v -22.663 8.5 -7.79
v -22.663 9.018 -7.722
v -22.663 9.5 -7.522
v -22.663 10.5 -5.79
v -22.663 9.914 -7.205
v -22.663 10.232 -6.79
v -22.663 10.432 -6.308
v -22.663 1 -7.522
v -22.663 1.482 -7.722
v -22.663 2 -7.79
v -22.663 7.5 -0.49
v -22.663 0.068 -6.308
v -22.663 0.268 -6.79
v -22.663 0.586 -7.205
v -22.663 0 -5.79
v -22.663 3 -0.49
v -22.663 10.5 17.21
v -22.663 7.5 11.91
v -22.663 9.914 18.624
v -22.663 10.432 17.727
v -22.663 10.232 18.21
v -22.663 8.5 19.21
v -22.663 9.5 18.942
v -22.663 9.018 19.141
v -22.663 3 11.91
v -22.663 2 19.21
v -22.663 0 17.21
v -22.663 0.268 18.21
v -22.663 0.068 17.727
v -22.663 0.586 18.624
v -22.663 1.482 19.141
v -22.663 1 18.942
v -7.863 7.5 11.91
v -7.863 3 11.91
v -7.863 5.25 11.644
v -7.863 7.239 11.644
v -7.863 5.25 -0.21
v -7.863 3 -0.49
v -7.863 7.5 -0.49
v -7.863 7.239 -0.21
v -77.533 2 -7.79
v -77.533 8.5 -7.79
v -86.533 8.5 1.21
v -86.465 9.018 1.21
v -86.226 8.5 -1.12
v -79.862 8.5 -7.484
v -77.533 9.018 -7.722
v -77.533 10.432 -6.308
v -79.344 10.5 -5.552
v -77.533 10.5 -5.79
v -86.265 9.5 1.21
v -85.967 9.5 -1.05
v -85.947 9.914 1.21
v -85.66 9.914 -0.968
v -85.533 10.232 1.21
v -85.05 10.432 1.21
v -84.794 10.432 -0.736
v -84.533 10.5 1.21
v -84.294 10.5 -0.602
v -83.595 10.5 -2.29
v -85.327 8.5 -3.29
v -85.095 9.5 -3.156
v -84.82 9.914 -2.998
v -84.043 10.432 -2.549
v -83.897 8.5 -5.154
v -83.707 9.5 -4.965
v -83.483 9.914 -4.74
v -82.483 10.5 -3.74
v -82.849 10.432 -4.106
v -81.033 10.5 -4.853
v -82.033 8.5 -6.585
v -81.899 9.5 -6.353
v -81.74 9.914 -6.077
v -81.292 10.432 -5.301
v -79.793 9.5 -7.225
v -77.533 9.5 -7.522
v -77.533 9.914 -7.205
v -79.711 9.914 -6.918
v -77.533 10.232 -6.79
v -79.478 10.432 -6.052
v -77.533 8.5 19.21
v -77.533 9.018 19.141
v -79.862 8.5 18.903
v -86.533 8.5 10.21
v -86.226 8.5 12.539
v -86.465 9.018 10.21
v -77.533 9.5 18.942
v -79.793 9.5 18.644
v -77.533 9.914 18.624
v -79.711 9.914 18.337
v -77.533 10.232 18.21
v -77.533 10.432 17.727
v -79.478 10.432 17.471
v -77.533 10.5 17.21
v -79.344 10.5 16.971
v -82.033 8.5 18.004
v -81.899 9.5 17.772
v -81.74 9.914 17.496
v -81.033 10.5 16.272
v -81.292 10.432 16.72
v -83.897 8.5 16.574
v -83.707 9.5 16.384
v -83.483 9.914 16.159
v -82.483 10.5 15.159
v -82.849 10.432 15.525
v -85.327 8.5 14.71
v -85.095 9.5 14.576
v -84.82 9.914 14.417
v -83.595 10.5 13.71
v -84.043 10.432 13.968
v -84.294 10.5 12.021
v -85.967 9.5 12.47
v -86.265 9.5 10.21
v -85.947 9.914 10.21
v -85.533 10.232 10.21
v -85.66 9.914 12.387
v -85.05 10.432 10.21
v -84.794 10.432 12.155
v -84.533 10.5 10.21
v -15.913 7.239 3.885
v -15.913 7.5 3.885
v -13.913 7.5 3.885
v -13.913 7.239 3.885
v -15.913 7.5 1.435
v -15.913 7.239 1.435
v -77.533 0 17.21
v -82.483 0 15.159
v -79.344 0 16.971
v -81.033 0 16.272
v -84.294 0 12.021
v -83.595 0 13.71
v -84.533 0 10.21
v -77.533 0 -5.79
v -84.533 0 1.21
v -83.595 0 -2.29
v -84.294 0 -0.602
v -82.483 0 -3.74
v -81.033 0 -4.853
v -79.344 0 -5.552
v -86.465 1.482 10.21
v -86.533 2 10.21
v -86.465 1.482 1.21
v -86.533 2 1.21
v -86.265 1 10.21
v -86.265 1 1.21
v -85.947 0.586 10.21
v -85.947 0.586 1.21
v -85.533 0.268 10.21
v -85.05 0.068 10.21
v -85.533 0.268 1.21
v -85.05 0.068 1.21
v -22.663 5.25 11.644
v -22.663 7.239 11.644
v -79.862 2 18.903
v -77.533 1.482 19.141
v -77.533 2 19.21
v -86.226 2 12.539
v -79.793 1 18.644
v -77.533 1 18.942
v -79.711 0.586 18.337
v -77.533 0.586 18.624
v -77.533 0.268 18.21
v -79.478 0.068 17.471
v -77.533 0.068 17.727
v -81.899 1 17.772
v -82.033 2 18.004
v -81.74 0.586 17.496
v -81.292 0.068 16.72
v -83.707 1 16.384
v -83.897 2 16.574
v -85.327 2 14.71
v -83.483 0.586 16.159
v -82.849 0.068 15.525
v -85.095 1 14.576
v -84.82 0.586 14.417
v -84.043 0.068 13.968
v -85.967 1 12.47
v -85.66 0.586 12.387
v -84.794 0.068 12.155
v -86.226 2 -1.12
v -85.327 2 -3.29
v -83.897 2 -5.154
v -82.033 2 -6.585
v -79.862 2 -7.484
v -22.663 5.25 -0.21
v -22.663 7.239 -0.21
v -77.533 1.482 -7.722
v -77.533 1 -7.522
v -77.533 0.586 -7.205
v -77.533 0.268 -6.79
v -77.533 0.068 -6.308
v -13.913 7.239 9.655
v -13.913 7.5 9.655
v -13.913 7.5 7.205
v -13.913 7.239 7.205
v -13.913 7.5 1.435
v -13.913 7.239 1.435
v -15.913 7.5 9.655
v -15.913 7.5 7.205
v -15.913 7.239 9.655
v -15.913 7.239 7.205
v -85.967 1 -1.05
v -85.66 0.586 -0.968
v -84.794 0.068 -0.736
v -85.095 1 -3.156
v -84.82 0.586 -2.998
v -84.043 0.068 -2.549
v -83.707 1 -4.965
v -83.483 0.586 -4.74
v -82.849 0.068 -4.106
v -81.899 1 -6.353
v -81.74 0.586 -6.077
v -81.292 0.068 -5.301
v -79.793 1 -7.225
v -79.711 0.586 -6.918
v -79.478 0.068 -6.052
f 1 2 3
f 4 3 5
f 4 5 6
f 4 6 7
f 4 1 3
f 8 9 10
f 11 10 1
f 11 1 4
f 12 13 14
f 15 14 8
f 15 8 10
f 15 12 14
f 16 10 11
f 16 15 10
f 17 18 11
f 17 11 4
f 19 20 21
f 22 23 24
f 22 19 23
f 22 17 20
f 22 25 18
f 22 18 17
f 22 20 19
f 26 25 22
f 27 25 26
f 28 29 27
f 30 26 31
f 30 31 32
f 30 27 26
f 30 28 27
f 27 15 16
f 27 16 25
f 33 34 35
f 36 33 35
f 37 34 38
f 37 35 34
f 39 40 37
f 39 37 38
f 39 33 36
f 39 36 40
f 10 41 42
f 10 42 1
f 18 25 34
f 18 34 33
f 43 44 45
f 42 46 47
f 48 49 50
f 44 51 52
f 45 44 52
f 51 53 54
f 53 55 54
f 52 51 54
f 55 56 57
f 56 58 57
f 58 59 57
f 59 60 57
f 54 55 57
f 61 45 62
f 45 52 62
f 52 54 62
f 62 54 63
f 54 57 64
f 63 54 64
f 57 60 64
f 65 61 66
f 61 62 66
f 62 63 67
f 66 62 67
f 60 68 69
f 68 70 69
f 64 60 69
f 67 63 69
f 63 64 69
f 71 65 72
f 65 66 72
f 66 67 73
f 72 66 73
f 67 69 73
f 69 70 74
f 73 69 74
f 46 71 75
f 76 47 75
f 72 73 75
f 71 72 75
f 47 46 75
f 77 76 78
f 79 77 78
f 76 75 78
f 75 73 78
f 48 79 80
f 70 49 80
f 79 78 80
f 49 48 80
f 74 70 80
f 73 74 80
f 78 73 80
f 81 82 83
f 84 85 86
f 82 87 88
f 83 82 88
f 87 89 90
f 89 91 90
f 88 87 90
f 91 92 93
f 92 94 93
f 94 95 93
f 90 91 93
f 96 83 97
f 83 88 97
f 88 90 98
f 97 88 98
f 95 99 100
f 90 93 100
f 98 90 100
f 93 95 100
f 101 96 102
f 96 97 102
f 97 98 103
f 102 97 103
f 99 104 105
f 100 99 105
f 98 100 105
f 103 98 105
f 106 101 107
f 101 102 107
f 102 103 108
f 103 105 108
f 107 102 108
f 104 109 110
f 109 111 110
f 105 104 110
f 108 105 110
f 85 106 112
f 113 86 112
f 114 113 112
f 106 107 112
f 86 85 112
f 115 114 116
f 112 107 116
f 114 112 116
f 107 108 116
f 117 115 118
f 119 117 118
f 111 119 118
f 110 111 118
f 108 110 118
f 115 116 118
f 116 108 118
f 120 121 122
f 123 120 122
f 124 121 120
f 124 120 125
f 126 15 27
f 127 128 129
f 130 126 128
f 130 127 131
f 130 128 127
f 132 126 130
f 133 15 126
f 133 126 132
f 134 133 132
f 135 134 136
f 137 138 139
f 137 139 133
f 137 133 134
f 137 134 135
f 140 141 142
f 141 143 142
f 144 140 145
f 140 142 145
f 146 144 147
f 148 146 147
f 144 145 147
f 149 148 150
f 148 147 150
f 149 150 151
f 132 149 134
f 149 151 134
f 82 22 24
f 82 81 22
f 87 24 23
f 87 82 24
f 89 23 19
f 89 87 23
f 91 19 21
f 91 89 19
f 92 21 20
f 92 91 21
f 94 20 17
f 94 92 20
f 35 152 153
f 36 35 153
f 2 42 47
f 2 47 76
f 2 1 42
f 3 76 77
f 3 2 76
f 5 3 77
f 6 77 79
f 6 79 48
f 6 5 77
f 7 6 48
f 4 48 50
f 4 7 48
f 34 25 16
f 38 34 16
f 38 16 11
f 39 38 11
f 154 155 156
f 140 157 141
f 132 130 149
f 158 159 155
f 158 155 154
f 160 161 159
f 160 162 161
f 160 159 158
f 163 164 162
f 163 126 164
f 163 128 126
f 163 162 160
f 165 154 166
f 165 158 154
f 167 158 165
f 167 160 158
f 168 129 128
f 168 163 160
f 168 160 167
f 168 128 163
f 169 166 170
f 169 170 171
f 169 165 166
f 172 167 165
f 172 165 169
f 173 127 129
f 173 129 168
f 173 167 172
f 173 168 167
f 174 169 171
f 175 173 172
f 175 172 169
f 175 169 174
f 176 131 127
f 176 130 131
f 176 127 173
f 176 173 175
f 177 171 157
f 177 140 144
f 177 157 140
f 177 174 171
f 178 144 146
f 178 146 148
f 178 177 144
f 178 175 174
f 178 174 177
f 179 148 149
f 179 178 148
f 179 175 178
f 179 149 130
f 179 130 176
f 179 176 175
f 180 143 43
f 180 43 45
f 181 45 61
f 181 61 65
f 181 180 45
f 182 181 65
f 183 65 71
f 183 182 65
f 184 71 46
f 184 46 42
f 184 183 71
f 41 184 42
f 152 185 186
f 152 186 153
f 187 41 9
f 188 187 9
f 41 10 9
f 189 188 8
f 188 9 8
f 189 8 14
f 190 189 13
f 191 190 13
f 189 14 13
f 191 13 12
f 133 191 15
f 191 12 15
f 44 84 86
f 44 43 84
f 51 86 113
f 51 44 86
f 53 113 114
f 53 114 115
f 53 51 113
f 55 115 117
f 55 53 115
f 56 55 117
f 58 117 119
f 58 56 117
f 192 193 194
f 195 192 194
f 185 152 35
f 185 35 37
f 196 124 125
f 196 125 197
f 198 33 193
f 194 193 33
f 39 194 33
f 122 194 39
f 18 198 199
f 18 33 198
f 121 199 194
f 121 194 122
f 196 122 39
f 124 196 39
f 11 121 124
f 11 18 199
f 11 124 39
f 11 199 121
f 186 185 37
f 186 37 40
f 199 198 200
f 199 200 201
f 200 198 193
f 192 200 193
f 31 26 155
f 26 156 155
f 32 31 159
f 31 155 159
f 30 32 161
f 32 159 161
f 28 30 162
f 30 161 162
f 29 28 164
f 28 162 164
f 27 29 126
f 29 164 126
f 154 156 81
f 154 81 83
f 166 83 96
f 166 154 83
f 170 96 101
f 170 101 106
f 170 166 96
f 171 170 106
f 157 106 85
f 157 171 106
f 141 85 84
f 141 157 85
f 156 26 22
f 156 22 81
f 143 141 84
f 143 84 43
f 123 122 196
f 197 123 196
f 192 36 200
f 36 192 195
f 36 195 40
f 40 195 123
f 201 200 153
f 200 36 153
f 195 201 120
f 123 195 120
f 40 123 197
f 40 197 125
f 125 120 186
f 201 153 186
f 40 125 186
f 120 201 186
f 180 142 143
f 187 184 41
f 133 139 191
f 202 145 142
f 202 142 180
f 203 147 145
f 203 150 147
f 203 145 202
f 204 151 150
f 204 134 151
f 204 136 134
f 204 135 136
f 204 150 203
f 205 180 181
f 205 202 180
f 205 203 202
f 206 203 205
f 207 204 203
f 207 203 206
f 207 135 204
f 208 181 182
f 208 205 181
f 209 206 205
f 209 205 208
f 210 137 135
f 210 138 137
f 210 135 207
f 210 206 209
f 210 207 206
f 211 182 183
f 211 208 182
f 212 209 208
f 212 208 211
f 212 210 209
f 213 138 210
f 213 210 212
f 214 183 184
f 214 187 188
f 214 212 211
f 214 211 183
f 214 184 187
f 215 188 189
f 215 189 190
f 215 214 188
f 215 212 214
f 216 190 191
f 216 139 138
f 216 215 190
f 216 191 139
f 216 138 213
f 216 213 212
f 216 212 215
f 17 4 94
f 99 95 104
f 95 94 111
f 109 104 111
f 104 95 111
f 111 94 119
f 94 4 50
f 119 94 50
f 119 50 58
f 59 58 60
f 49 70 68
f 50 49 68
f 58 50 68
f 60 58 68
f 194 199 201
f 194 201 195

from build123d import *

# Parameters (mm, degrees)
BOSS_EXTRUDE1_DEPTH = 10.5
FILLET3_R           = 2
SKETCH3_W           = 12.4
SKETCH3_H           = 4.5
SKETCH3_W_2         = 11.854567875
SKETCH3_H_2         = 1.988610451
BOSS_EXTRUDE2_DEPTH = 14.8
SKETCH4_W           = 2
SKETCH4_H           = 2.45
CUT_EXTRUDE1_DEPTH  = 1


with BuildPart() as part:
    # Sketch1 → Boss-Extrude1 (new body)
    with BuildSketch(Plane(origin=(0, 0, 0), x_dir=(1, 0, 0), z_dir=(0, 1, 0))):
        with BuildLine():
            ThreePointArc((-77.532758891, -19.20955436), (-83.896719922, -16.57351539), (-86.532758891, -10.20955436))
            Line((-86.532758891, -10.20955436), (-86.532758891, -1.20955436))
            ThreePointArc((-86.532758891, -1.20955436), (-83.896719922, 5.154406671), (-77.532758891, 7.79044564))
            Line((-77.532758891, 7.79044564), (-22.663339977, 7.79044564))
            Line((-22.663339977, 7.79044564), (-22.663339977, -19.20955436))
            Line((-22.663339977, -19.20955436), (-77.532758891, -19.20955436))
        make_face()
    extrude(amount=BOSS_EXTRUDE1_DEPTH)

    # Fillet3
    fillet3_edges = [part.edges().sort_by_distance(p)[0] for p in [
        (-50.098049434, 10.5, -7.79044564),
        (-83.896719922, 10.5, -5.154406671),
        (-86.532758891, 10.5, 5.70955436),
        (-83.896719922, 10.5, 16.57351539),
        (-86.532758891, 0, 5.70955436),
        (-83.896719922, 0, -5.154406671),
        (-50.098049434, 0, -7.79044564),
        (-50.098049434, 10.5, 19.20955436),
        (-50.098049434, 0, 19.20955436),
        (-83.896719922, 0, 16.57351539),
    ]]
    fillet(fillet3_edges, radius=FILLET3_R)

    # Sketch3 → Boss-Extrude2 (add)
    with BuildSketch(Plane(origin=(-22.663339977, 0, 0), x_dir=(0, 0, -1), z_dir=(1, 0, 0))):
        with Locations((-5.70955436, 5.25)):
            Rectangle(SKETCH3_W, SKETCH3_H)
        with Locations((-5.717006669, 6.244305225)):
            Rectangle(SKETCH3_W_2, SKETCH3_H_2, mode=Mode.SUBTRACT)
    extrude(amount=BOSS_EXTRUDE2_DEPTH)

    # Sketch4 → Cut-Extrude1 (cut)
    with BuildSketch(Plane(origin=(0, 7.5, 0), x_dir=(1, 0, 0), z_dir=(0, 1, 0))):
        with Locations((-14.913433207, -2.660071761)):
            Rectangle(SKETCH4_W, SKETCH4_H)
        with Locations((-14.913433207, -8.429959353)):
            Rectangle(SKETCH4_W, SKETCH4_H)
    extrude(amount=-CUT_EXTRUDE1_DEPTH, mode=Mode.SUBTRACT)


solid = part.part
